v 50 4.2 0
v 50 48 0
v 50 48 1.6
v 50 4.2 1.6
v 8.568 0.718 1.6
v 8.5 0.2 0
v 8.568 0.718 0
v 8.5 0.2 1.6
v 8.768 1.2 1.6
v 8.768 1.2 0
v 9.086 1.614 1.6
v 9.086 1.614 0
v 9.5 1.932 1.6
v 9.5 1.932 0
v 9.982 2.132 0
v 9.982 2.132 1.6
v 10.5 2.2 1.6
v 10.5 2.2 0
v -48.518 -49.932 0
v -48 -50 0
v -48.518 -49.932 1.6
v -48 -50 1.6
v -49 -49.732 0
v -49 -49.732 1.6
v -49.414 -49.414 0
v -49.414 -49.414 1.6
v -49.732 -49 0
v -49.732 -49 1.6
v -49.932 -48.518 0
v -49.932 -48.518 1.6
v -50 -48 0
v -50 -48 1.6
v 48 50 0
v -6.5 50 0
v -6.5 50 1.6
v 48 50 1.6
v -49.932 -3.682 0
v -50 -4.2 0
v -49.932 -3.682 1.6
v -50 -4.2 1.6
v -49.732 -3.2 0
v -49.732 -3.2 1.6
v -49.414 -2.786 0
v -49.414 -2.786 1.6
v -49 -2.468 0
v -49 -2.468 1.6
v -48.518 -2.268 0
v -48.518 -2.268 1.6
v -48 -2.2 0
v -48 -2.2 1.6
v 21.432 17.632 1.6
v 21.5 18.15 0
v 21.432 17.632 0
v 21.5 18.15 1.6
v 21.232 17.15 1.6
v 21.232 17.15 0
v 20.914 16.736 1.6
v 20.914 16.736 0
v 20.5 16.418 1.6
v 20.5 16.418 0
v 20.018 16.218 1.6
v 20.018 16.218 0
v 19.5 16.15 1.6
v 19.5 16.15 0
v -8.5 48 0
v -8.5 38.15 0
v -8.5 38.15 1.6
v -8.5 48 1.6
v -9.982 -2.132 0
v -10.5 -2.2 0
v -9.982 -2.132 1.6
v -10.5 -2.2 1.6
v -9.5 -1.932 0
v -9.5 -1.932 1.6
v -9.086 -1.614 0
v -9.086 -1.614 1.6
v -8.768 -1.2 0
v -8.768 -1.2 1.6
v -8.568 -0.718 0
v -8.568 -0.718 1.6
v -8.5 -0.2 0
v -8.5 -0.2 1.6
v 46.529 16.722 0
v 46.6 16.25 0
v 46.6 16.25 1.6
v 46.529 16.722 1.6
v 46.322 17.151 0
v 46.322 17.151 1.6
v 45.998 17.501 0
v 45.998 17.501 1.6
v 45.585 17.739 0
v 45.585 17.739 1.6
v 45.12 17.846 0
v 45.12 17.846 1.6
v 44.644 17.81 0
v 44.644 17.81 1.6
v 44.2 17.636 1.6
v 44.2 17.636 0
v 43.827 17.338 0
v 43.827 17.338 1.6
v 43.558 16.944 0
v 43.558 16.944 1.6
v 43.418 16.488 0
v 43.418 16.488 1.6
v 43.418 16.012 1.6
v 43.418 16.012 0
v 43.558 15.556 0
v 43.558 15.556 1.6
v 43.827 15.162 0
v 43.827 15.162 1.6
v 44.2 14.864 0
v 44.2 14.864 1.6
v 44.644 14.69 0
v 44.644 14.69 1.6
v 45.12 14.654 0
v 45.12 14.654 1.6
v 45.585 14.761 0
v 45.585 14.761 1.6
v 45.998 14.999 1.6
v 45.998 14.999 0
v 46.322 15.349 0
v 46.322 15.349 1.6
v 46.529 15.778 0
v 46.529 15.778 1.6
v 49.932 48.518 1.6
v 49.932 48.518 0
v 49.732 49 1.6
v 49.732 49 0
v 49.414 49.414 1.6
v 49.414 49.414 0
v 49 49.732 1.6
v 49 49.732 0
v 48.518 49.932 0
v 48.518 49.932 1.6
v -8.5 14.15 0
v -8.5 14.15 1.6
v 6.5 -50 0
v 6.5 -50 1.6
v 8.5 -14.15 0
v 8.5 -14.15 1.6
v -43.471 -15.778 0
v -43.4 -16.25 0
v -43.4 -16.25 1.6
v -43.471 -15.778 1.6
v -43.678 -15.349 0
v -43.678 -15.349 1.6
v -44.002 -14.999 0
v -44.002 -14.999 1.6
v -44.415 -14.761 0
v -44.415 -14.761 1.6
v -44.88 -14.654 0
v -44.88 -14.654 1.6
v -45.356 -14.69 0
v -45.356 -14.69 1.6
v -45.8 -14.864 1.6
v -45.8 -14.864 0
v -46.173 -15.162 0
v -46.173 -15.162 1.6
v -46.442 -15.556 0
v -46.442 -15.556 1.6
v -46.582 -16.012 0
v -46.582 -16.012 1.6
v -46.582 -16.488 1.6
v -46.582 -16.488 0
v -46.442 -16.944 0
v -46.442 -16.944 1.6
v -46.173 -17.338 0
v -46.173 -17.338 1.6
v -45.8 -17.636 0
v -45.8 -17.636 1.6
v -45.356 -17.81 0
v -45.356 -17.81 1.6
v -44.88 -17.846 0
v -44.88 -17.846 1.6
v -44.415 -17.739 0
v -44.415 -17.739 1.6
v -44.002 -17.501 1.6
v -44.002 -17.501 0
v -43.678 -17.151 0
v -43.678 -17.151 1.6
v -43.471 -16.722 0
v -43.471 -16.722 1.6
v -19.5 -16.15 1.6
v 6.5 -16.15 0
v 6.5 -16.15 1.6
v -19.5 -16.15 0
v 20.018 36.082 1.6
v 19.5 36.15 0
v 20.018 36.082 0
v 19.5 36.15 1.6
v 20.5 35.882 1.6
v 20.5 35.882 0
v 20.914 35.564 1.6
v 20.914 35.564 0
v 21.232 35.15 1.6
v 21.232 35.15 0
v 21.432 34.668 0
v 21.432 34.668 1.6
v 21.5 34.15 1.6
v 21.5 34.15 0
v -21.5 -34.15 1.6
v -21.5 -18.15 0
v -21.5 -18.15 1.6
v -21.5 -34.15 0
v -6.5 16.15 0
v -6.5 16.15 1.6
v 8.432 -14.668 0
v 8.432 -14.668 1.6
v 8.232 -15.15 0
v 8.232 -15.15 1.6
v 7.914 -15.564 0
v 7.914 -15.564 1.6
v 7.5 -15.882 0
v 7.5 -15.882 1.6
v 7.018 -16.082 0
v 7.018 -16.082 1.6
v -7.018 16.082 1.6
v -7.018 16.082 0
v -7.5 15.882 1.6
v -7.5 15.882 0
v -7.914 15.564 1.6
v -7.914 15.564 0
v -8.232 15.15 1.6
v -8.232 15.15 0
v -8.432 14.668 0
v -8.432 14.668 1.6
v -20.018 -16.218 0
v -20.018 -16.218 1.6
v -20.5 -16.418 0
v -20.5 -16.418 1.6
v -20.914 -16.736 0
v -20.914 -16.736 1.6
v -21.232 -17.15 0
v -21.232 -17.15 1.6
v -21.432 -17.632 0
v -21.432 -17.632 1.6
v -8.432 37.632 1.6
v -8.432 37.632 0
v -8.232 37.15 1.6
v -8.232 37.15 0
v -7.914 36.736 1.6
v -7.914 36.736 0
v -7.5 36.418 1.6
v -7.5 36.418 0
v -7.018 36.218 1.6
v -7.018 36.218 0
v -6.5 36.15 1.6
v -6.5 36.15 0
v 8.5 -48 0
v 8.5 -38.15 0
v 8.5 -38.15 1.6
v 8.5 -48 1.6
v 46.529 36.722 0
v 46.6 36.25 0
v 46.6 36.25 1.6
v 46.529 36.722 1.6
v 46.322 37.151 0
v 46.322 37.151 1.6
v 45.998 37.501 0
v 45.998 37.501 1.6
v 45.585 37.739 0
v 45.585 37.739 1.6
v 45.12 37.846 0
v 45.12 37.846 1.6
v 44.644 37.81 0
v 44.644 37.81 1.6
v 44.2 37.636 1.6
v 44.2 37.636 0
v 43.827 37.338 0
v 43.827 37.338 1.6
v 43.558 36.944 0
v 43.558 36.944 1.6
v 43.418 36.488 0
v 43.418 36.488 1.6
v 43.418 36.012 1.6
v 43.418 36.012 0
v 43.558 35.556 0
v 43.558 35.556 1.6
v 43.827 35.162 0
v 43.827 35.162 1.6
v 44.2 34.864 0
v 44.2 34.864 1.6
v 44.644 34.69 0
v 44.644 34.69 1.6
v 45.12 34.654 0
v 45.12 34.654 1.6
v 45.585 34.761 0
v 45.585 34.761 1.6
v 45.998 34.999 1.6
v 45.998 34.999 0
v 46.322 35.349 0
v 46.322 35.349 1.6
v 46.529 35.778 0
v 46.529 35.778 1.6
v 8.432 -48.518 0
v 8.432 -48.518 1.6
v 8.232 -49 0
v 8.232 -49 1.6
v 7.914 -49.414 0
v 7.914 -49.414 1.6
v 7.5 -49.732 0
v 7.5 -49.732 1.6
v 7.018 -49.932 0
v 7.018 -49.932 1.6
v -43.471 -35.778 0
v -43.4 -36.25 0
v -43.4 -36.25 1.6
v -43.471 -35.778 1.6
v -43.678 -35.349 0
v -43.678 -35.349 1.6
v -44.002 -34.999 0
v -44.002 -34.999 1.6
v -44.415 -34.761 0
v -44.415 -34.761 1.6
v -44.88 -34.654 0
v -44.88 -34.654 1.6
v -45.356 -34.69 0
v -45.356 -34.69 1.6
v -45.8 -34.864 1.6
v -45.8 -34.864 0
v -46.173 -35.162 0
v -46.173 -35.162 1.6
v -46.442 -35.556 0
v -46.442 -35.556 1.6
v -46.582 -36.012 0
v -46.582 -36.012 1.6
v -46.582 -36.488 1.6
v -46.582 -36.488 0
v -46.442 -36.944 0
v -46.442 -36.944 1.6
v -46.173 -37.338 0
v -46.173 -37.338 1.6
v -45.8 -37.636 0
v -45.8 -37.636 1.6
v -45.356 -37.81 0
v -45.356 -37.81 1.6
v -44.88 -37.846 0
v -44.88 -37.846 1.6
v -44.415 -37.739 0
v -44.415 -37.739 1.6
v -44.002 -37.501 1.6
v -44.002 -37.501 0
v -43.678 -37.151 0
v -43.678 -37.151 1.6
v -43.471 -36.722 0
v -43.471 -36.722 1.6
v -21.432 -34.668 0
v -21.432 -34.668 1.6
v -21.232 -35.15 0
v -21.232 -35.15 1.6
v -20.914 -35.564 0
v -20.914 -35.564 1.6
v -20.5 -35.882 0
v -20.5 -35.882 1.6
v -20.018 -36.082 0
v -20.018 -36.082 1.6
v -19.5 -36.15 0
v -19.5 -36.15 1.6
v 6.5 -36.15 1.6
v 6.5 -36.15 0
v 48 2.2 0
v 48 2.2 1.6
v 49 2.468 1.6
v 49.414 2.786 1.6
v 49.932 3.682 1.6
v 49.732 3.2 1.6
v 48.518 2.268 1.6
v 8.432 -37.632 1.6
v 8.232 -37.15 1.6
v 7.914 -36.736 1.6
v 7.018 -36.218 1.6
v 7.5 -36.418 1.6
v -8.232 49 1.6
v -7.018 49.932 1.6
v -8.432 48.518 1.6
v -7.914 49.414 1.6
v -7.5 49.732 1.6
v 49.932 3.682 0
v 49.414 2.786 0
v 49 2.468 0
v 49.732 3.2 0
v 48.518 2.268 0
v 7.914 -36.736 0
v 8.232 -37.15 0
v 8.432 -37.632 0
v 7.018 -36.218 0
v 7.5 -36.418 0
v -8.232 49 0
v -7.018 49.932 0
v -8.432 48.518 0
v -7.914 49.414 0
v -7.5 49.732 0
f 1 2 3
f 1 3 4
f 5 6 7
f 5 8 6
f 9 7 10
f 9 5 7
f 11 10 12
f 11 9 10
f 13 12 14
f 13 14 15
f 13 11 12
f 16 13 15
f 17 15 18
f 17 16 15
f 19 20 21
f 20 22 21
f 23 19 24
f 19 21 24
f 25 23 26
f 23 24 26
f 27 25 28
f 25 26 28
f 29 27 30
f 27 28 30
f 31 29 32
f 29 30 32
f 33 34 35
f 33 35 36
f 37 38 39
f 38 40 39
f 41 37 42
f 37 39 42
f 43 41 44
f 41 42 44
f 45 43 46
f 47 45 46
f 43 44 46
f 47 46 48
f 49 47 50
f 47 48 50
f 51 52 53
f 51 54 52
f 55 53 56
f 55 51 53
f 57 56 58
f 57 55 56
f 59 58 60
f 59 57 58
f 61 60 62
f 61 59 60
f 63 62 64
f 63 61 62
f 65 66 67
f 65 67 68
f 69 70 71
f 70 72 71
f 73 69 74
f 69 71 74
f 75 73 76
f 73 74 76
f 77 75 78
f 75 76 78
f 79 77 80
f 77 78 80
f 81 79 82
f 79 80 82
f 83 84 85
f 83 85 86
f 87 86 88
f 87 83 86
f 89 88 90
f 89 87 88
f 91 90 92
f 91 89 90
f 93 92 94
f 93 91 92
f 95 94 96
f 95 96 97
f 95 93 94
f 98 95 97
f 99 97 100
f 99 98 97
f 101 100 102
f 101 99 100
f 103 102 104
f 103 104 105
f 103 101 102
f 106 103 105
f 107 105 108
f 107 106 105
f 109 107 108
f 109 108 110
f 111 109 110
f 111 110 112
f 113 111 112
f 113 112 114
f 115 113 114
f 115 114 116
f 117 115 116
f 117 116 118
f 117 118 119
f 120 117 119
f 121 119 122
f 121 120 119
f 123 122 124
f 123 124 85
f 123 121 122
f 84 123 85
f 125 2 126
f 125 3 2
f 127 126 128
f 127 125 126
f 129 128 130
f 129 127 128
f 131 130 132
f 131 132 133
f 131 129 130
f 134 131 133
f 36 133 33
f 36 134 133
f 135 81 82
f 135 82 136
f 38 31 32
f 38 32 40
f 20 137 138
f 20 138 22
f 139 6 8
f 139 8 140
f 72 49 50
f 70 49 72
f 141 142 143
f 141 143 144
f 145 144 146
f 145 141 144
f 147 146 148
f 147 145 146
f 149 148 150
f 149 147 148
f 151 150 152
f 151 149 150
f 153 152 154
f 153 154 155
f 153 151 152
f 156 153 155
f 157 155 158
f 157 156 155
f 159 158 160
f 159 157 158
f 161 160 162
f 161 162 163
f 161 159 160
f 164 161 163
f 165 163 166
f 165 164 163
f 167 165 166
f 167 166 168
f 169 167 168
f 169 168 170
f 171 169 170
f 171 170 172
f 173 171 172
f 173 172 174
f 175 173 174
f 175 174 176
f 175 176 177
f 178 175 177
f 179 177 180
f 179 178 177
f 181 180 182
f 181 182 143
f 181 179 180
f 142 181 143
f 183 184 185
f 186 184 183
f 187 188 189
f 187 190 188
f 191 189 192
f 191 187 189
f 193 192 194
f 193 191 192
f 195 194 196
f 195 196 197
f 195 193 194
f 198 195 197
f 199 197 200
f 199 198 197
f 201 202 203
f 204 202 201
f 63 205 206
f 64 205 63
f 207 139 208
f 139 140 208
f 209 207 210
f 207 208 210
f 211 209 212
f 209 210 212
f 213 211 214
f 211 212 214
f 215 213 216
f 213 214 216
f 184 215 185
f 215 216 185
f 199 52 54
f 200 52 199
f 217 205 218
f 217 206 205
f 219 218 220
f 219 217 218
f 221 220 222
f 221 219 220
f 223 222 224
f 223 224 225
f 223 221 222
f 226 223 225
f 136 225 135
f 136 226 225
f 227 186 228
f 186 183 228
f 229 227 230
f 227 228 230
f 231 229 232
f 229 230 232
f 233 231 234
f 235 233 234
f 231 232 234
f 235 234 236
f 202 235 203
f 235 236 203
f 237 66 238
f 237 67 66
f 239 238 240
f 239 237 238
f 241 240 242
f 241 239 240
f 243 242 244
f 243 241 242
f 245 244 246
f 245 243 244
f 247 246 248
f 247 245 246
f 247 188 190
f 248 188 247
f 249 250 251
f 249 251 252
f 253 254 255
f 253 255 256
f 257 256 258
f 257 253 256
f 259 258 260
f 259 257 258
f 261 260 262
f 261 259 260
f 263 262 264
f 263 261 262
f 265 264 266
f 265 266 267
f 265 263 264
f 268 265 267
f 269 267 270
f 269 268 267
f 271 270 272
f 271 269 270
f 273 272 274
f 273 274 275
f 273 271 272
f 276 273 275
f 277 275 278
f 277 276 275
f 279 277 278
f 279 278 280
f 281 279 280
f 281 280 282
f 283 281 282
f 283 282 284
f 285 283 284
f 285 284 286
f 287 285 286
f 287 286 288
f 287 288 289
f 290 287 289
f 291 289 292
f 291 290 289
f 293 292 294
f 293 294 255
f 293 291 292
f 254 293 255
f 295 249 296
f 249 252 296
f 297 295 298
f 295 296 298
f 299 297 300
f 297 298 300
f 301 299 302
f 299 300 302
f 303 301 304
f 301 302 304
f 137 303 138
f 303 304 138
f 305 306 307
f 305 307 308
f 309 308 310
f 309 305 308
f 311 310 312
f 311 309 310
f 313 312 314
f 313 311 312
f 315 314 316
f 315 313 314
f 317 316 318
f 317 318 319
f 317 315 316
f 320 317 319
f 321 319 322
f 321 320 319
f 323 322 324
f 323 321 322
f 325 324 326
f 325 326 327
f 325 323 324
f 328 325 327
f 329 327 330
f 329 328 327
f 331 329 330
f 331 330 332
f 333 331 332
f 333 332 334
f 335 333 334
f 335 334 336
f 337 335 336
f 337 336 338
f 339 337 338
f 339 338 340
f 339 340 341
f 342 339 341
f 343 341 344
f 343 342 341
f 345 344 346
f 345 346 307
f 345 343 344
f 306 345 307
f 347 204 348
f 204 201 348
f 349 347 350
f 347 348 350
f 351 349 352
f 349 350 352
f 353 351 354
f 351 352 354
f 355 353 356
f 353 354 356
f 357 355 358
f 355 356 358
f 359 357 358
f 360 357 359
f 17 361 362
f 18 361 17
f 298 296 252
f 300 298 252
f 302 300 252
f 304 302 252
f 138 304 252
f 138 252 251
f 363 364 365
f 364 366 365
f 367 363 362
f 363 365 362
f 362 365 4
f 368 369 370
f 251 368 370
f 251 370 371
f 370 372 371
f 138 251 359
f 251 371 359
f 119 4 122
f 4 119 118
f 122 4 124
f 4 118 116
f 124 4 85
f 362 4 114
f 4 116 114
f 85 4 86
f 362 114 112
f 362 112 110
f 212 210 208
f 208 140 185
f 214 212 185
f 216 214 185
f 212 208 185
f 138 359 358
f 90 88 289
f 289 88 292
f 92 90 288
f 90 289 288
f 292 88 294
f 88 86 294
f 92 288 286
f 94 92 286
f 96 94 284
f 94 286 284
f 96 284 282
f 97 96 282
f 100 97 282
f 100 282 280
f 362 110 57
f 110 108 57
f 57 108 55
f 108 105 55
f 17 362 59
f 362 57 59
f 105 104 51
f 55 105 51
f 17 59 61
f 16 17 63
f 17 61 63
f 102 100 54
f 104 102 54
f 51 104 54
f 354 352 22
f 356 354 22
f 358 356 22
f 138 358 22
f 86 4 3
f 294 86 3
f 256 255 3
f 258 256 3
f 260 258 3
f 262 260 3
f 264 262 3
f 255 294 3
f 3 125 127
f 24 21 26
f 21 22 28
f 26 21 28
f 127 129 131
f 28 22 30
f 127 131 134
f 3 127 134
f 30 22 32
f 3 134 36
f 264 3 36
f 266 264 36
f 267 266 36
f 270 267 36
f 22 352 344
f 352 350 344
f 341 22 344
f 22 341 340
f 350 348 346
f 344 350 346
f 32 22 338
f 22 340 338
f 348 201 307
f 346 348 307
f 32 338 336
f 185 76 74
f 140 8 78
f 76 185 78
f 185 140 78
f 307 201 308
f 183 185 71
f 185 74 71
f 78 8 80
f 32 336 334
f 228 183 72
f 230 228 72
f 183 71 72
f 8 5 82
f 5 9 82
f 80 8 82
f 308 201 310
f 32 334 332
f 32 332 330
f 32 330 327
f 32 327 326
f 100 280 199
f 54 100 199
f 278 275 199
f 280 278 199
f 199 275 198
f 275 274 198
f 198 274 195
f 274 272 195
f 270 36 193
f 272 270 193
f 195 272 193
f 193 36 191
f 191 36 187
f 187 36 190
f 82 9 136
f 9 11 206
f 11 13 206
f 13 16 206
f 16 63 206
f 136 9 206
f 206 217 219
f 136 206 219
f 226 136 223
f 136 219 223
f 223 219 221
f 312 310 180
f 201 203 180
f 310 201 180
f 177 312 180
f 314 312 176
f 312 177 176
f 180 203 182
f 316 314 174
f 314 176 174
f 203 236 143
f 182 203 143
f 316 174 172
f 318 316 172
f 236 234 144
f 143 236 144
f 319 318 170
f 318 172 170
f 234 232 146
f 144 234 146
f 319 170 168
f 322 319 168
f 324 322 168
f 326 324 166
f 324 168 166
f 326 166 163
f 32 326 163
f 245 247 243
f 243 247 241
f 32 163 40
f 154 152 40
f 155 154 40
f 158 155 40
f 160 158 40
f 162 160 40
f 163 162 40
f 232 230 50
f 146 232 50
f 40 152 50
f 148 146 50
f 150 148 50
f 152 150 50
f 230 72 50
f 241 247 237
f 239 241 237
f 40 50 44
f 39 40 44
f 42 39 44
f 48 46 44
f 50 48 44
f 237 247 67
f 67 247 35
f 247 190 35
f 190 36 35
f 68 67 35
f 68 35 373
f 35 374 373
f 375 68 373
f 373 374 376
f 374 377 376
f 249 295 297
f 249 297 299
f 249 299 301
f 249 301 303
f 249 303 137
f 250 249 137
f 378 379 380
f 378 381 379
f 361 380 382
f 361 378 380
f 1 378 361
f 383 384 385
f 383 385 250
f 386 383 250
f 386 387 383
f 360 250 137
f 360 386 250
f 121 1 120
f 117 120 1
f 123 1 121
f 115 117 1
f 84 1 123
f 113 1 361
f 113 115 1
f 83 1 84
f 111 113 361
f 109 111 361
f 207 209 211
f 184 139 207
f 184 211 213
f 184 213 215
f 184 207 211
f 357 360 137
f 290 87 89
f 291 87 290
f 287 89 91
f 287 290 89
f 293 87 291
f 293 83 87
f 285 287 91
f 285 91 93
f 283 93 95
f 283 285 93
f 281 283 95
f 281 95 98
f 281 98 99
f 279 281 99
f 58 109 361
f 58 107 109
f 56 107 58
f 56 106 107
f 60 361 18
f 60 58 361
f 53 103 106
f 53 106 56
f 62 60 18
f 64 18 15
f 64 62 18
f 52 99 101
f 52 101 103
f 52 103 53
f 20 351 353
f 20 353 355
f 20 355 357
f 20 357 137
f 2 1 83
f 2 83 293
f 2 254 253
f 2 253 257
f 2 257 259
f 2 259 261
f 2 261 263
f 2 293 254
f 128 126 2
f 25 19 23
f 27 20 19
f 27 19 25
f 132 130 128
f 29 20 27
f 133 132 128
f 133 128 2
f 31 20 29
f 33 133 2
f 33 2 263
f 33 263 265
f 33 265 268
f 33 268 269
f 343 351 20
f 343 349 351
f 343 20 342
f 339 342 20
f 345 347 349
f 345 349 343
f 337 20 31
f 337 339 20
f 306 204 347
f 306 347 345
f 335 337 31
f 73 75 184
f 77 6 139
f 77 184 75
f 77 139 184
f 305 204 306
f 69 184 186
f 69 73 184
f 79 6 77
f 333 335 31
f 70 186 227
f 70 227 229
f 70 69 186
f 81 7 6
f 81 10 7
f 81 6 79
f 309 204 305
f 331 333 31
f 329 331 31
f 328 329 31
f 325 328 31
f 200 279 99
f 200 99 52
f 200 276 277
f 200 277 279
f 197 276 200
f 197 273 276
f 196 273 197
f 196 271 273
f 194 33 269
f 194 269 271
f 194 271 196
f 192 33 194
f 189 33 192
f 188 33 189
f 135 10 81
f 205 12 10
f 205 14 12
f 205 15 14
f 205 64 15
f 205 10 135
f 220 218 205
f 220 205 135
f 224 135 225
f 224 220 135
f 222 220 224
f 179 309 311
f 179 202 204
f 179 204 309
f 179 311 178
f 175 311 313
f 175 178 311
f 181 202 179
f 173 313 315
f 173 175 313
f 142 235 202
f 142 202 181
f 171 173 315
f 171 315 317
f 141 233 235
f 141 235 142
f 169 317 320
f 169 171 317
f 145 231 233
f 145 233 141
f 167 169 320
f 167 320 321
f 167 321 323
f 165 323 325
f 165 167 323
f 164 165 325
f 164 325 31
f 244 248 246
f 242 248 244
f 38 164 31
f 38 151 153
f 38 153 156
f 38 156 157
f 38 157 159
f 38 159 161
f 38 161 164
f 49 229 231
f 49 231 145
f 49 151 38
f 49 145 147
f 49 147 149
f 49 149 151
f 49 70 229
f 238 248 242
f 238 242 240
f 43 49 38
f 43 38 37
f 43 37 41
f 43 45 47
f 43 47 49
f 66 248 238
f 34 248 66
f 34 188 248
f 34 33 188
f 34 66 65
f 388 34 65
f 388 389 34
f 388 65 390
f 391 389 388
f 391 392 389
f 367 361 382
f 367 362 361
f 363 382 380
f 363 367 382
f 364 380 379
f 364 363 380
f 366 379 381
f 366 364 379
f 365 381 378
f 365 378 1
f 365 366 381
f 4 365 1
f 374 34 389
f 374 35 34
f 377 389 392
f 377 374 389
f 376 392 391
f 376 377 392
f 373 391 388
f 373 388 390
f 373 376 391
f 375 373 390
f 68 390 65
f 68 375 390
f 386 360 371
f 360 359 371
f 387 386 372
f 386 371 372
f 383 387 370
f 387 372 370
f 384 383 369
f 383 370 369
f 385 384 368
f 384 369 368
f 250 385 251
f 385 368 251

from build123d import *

# Parameters (mm, degrees)
SKETCH_1_R      = 1.6
EXTRUDE_1_DEPTH = 1.6
FILLET_1_R      = 2


with BuildPart() as part:
    # 草图1 → 凸台-拉伸1 (new body)
    with BuildSketch(Plane.XY):
        Polygon((8.5, 2.2), (8.5, -16.15), (-21.5, -16.15), (-21.5, -36.15), (8.5, -36.15), (8.5, -50), (-50, -50), (-50, -2.2), (-8.5, -2.2), (-8.5, 16.15), (21.5, 16.15), (21.5, 36.15), (-8.5, 36.15), (-8.5, 50), (50, 50), (50, 2.2), align=None)
        with Locations((-45, -36.25)):
            Circle(SKETCH_1_R, mode=Mode.SUBTRACT)
        with Locations((-45, -16.25)):
            Circle(SKETCH_1_R, mode=Mode.SUBTRACT)
        with Locations((45, 16.25)):
            Circle(SKETCH_1_R, mode=Mode.SUBTRACT)
        with Locations((45, 36.25)):
            Circle(SKETCH_1_R, mode=Mode.SUBTRACT)
    extrude(amount=EXTRUDE_1_DEPTH)

    # 圆角1
    fillet_1_edges = [part.edges().sort_by_distance(p)[0] for p in [
        (8.5, 2.2, 0.8),
        (8.5, -16.15, 0.8),
        (-21.5, -16.15, 0.8),
        (-21.5, -36.15, 0.8),
        (8.5, -36.15, 0.8),
        (8.5, -50, 0.8),
        (-50, -50, 0.8),
        (-50, -2.2, 0.8),
        (-8.5, -2.2, 0.8),
        (-8.5, 16.15, 0.8),
        (21.5, 16.15, 0.8),
        (21.5, 36.15, 0.8),
        (-8.5, 36.15, 0.8),
        (-8.5, 50, 0.8),
        (50, 50, 0.8),
        (50, 2.2, 0.8),
    ]]
    fillet(fillet_1_edges, radius=FILLET_1_R)


solid = part.part
